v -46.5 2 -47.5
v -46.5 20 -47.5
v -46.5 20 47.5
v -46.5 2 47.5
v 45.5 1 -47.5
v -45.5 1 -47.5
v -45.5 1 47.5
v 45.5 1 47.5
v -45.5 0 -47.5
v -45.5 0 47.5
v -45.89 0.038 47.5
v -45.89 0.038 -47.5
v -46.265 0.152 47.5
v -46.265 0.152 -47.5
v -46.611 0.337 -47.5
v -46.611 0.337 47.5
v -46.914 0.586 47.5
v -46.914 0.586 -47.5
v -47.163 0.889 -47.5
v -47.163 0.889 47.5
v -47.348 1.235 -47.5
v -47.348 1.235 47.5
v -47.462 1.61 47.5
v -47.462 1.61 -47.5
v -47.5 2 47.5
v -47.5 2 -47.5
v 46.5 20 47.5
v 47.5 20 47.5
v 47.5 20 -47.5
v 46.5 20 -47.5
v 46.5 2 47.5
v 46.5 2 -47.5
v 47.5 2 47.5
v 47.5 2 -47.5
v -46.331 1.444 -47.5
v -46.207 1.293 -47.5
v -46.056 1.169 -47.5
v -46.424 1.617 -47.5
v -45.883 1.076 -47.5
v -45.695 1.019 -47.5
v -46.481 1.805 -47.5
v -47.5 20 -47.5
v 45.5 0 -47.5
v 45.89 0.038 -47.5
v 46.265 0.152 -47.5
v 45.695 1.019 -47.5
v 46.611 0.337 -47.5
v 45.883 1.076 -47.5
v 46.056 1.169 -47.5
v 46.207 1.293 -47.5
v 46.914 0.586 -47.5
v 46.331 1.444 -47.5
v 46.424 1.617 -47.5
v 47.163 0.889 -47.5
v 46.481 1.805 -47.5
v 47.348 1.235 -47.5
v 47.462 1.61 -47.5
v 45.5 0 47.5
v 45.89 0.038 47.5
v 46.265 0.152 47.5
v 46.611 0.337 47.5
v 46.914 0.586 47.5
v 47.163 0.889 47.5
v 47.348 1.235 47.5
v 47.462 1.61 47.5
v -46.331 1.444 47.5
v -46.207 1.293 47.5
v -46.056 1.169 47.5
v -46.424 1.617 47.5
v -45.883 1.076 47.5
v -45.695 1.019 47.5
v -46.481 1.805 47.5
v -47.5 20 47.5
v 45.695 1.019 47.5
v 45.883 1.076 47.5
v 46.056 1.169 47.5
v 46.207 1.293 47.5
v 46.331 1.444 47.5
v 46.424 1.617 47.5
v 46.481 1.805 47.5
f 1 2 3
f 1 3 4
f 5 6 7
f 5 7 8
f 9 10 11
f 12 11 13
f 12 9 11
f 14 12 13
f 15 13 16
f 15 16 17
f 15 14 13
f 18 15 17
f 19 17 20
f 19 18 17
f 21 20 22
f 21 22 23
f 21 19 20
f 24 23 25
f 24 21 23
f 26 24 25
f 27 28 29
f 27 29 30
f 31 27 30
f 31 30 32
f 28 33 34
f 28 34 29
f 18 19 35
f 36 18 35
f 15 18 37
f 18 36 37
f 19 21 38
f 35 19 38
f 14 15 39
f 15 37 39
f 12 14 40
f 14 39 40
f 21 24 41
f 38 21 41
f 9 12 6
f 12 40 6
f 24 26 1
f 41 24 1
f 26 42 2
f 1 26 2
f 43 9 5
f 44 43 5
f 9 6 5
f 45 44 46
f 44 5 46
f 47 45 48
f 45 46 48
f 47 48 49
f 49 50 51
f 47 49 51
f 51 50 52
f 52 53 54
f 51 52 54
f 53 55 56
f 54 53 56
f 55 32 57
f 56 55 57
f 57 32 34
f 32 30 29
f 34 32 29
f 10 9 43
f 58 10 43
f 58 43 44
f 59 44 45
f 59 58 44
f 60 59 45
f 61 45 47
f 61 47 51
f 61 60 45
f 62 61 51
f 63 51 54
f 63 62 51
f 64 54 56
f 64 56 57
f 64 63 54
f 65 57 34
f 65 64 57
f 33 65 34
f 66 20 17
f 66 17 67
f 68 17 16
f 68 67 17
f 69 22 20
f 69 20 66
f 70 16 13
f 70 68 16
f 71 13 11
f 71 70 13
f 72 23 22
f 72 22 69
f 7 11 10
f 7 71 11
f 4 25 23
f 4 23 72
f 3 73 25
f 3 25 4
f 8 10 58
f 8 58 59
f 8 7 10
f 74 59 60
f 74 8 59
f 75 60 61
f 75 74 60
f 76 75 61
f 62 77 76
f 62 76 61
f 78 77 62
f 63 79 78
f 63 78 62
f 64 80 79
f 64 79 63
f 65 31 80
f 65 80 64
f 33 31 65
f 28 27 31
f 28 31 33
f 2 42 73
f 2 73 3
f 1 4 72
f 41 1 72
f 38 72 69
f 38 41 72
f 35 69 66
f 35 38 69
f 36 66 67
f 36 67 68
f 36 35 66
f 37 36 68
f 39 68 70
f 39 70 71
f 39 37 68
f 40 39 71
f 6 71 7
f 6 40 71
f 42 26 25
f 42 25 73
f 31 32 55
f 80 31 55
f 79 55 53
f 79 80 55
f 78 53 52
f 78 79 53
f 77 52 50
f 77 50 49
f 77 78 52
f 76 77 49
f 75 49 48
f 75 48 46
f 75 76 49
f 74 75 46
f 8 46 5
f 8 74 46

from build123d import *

# Parameters (mm, degrees)
SKETCH1_W                      = 95
SKETCH1_H                      = 95
BOSS_EXTRUDE1_DEPTH            = 1
EDGE_FLANGE1_STRIP_W           = 6
EDGE_FLANGE1_STRIP_H           = 1
EDGE_FLANGE1_STRIP_CUT_DEPTH   = 95
EDGE_FLANGE1_STRIP_2_W         = 6
EDGE_FLANGE1_STRIP_2_H         = 1
EDGE_FLANGE1_STRIP_CUT_2_DEPTH = 95
EDGE_FLANGE1_DEPTH             = 95
EDGE_FLANGE1_BEND_DEPTH        = 95


# Sheet-metal steps are written as plain solids
with BuildPart() as part:
    # Sketch1 → Boss-Extrude1 (new body)
    with BuildSketch(Plane(origin=(0, 0, 0), x_dir=(1, 0, 0), z_dir=(0, 1, 0))):
        Rectangle(SKETCH1_W, SKETCH1_H)
    extrude(amount=BOSS_EXTRUDE1_DEPTH)

    # Edge-Flange1 strip (across the edge) → Edge-Flange1 strip cut (cut)
    with BuildSketch(Plane(origin=(-47.5, 1, -47.5), x_dir=(1, 0, 0), z_dir=(0, 0, 1))):
        with Locations((-1, -0.5)):
            Rectangle(EDGE_FLANGE1_STRIP_W, EDGE_FLANGE1_STRIP_H)
    extrude(amount=EDGE_FLANGE1_STRIP_CUT_DEPTH, mode=Mode.SUBTRACT)

    # Edge-Flange1 strip 2 (across the edge) → Edge-Flange1 strip cut 2 (cut)
    with BuildSketch(Plane(origin=(47.5, 1, 47.5), x_dir=(-1, 0, 0), z_dir=(0, 0, -1))):
        with Locations((-1, -0.5)):
            Rectangle(EDGE_FLANGE1_STRIP_2_W, EDGE_FLANGE1_STRIP_2_H)
    extrude(amount=EDGE_FLANGE1_STRIP_CUT_2_DEPTH, mode=Mode.SUBTRACT)

    # Edge-Flange1 section (across the edge) → Edge-Flange1 (add)
    with BuildSketch(Plane(origin=(-47.5, 1, -47.5), x_dir=(1, 0, 0), z_dir=(0, 0, 1))):
        with BuildLine():
            Line((0, 1), (0, 19))
            Line((0, 19), (1, 19))
            Line((1, 19), (1, 1))
            ThreePointArc((1, 1), (1.292893219, 0.292893219), (2, 0))
            Line((2, 0), (2, -1))
            ThreePointArc((2, -1), (0.585786438, -0.414213562), (0, 1))
        make_face()
    extrude(amount=EDGE_FLANGE1_DEPTH)

    # Edge-Flange1 section 2 (across the edge) → Edge-Flange1 bend (add)
    with BuildSketch(Plane(origin=(47.5, 1, 47.5), x_dir=(-1, 0, 0), z_dir=(0, 0, -1))):
        with BuildLine():
            Line((0, 1), (0, 19))
            Line((0, 19), (1, 19))
            Line((1, 19), (1, 1))
            ThreePointArc((1, 1), (1.292893219, 0.292893219), (2, 0))
            Line((2, 0), (2, -1))
            ThreePointArc((2, -1), (0.585786438, -0.414213562), (0, 1))
        make_face()
    extrude(amount=EDGE_FLANGE1_BEND_DEPTH)


solid = part.part
